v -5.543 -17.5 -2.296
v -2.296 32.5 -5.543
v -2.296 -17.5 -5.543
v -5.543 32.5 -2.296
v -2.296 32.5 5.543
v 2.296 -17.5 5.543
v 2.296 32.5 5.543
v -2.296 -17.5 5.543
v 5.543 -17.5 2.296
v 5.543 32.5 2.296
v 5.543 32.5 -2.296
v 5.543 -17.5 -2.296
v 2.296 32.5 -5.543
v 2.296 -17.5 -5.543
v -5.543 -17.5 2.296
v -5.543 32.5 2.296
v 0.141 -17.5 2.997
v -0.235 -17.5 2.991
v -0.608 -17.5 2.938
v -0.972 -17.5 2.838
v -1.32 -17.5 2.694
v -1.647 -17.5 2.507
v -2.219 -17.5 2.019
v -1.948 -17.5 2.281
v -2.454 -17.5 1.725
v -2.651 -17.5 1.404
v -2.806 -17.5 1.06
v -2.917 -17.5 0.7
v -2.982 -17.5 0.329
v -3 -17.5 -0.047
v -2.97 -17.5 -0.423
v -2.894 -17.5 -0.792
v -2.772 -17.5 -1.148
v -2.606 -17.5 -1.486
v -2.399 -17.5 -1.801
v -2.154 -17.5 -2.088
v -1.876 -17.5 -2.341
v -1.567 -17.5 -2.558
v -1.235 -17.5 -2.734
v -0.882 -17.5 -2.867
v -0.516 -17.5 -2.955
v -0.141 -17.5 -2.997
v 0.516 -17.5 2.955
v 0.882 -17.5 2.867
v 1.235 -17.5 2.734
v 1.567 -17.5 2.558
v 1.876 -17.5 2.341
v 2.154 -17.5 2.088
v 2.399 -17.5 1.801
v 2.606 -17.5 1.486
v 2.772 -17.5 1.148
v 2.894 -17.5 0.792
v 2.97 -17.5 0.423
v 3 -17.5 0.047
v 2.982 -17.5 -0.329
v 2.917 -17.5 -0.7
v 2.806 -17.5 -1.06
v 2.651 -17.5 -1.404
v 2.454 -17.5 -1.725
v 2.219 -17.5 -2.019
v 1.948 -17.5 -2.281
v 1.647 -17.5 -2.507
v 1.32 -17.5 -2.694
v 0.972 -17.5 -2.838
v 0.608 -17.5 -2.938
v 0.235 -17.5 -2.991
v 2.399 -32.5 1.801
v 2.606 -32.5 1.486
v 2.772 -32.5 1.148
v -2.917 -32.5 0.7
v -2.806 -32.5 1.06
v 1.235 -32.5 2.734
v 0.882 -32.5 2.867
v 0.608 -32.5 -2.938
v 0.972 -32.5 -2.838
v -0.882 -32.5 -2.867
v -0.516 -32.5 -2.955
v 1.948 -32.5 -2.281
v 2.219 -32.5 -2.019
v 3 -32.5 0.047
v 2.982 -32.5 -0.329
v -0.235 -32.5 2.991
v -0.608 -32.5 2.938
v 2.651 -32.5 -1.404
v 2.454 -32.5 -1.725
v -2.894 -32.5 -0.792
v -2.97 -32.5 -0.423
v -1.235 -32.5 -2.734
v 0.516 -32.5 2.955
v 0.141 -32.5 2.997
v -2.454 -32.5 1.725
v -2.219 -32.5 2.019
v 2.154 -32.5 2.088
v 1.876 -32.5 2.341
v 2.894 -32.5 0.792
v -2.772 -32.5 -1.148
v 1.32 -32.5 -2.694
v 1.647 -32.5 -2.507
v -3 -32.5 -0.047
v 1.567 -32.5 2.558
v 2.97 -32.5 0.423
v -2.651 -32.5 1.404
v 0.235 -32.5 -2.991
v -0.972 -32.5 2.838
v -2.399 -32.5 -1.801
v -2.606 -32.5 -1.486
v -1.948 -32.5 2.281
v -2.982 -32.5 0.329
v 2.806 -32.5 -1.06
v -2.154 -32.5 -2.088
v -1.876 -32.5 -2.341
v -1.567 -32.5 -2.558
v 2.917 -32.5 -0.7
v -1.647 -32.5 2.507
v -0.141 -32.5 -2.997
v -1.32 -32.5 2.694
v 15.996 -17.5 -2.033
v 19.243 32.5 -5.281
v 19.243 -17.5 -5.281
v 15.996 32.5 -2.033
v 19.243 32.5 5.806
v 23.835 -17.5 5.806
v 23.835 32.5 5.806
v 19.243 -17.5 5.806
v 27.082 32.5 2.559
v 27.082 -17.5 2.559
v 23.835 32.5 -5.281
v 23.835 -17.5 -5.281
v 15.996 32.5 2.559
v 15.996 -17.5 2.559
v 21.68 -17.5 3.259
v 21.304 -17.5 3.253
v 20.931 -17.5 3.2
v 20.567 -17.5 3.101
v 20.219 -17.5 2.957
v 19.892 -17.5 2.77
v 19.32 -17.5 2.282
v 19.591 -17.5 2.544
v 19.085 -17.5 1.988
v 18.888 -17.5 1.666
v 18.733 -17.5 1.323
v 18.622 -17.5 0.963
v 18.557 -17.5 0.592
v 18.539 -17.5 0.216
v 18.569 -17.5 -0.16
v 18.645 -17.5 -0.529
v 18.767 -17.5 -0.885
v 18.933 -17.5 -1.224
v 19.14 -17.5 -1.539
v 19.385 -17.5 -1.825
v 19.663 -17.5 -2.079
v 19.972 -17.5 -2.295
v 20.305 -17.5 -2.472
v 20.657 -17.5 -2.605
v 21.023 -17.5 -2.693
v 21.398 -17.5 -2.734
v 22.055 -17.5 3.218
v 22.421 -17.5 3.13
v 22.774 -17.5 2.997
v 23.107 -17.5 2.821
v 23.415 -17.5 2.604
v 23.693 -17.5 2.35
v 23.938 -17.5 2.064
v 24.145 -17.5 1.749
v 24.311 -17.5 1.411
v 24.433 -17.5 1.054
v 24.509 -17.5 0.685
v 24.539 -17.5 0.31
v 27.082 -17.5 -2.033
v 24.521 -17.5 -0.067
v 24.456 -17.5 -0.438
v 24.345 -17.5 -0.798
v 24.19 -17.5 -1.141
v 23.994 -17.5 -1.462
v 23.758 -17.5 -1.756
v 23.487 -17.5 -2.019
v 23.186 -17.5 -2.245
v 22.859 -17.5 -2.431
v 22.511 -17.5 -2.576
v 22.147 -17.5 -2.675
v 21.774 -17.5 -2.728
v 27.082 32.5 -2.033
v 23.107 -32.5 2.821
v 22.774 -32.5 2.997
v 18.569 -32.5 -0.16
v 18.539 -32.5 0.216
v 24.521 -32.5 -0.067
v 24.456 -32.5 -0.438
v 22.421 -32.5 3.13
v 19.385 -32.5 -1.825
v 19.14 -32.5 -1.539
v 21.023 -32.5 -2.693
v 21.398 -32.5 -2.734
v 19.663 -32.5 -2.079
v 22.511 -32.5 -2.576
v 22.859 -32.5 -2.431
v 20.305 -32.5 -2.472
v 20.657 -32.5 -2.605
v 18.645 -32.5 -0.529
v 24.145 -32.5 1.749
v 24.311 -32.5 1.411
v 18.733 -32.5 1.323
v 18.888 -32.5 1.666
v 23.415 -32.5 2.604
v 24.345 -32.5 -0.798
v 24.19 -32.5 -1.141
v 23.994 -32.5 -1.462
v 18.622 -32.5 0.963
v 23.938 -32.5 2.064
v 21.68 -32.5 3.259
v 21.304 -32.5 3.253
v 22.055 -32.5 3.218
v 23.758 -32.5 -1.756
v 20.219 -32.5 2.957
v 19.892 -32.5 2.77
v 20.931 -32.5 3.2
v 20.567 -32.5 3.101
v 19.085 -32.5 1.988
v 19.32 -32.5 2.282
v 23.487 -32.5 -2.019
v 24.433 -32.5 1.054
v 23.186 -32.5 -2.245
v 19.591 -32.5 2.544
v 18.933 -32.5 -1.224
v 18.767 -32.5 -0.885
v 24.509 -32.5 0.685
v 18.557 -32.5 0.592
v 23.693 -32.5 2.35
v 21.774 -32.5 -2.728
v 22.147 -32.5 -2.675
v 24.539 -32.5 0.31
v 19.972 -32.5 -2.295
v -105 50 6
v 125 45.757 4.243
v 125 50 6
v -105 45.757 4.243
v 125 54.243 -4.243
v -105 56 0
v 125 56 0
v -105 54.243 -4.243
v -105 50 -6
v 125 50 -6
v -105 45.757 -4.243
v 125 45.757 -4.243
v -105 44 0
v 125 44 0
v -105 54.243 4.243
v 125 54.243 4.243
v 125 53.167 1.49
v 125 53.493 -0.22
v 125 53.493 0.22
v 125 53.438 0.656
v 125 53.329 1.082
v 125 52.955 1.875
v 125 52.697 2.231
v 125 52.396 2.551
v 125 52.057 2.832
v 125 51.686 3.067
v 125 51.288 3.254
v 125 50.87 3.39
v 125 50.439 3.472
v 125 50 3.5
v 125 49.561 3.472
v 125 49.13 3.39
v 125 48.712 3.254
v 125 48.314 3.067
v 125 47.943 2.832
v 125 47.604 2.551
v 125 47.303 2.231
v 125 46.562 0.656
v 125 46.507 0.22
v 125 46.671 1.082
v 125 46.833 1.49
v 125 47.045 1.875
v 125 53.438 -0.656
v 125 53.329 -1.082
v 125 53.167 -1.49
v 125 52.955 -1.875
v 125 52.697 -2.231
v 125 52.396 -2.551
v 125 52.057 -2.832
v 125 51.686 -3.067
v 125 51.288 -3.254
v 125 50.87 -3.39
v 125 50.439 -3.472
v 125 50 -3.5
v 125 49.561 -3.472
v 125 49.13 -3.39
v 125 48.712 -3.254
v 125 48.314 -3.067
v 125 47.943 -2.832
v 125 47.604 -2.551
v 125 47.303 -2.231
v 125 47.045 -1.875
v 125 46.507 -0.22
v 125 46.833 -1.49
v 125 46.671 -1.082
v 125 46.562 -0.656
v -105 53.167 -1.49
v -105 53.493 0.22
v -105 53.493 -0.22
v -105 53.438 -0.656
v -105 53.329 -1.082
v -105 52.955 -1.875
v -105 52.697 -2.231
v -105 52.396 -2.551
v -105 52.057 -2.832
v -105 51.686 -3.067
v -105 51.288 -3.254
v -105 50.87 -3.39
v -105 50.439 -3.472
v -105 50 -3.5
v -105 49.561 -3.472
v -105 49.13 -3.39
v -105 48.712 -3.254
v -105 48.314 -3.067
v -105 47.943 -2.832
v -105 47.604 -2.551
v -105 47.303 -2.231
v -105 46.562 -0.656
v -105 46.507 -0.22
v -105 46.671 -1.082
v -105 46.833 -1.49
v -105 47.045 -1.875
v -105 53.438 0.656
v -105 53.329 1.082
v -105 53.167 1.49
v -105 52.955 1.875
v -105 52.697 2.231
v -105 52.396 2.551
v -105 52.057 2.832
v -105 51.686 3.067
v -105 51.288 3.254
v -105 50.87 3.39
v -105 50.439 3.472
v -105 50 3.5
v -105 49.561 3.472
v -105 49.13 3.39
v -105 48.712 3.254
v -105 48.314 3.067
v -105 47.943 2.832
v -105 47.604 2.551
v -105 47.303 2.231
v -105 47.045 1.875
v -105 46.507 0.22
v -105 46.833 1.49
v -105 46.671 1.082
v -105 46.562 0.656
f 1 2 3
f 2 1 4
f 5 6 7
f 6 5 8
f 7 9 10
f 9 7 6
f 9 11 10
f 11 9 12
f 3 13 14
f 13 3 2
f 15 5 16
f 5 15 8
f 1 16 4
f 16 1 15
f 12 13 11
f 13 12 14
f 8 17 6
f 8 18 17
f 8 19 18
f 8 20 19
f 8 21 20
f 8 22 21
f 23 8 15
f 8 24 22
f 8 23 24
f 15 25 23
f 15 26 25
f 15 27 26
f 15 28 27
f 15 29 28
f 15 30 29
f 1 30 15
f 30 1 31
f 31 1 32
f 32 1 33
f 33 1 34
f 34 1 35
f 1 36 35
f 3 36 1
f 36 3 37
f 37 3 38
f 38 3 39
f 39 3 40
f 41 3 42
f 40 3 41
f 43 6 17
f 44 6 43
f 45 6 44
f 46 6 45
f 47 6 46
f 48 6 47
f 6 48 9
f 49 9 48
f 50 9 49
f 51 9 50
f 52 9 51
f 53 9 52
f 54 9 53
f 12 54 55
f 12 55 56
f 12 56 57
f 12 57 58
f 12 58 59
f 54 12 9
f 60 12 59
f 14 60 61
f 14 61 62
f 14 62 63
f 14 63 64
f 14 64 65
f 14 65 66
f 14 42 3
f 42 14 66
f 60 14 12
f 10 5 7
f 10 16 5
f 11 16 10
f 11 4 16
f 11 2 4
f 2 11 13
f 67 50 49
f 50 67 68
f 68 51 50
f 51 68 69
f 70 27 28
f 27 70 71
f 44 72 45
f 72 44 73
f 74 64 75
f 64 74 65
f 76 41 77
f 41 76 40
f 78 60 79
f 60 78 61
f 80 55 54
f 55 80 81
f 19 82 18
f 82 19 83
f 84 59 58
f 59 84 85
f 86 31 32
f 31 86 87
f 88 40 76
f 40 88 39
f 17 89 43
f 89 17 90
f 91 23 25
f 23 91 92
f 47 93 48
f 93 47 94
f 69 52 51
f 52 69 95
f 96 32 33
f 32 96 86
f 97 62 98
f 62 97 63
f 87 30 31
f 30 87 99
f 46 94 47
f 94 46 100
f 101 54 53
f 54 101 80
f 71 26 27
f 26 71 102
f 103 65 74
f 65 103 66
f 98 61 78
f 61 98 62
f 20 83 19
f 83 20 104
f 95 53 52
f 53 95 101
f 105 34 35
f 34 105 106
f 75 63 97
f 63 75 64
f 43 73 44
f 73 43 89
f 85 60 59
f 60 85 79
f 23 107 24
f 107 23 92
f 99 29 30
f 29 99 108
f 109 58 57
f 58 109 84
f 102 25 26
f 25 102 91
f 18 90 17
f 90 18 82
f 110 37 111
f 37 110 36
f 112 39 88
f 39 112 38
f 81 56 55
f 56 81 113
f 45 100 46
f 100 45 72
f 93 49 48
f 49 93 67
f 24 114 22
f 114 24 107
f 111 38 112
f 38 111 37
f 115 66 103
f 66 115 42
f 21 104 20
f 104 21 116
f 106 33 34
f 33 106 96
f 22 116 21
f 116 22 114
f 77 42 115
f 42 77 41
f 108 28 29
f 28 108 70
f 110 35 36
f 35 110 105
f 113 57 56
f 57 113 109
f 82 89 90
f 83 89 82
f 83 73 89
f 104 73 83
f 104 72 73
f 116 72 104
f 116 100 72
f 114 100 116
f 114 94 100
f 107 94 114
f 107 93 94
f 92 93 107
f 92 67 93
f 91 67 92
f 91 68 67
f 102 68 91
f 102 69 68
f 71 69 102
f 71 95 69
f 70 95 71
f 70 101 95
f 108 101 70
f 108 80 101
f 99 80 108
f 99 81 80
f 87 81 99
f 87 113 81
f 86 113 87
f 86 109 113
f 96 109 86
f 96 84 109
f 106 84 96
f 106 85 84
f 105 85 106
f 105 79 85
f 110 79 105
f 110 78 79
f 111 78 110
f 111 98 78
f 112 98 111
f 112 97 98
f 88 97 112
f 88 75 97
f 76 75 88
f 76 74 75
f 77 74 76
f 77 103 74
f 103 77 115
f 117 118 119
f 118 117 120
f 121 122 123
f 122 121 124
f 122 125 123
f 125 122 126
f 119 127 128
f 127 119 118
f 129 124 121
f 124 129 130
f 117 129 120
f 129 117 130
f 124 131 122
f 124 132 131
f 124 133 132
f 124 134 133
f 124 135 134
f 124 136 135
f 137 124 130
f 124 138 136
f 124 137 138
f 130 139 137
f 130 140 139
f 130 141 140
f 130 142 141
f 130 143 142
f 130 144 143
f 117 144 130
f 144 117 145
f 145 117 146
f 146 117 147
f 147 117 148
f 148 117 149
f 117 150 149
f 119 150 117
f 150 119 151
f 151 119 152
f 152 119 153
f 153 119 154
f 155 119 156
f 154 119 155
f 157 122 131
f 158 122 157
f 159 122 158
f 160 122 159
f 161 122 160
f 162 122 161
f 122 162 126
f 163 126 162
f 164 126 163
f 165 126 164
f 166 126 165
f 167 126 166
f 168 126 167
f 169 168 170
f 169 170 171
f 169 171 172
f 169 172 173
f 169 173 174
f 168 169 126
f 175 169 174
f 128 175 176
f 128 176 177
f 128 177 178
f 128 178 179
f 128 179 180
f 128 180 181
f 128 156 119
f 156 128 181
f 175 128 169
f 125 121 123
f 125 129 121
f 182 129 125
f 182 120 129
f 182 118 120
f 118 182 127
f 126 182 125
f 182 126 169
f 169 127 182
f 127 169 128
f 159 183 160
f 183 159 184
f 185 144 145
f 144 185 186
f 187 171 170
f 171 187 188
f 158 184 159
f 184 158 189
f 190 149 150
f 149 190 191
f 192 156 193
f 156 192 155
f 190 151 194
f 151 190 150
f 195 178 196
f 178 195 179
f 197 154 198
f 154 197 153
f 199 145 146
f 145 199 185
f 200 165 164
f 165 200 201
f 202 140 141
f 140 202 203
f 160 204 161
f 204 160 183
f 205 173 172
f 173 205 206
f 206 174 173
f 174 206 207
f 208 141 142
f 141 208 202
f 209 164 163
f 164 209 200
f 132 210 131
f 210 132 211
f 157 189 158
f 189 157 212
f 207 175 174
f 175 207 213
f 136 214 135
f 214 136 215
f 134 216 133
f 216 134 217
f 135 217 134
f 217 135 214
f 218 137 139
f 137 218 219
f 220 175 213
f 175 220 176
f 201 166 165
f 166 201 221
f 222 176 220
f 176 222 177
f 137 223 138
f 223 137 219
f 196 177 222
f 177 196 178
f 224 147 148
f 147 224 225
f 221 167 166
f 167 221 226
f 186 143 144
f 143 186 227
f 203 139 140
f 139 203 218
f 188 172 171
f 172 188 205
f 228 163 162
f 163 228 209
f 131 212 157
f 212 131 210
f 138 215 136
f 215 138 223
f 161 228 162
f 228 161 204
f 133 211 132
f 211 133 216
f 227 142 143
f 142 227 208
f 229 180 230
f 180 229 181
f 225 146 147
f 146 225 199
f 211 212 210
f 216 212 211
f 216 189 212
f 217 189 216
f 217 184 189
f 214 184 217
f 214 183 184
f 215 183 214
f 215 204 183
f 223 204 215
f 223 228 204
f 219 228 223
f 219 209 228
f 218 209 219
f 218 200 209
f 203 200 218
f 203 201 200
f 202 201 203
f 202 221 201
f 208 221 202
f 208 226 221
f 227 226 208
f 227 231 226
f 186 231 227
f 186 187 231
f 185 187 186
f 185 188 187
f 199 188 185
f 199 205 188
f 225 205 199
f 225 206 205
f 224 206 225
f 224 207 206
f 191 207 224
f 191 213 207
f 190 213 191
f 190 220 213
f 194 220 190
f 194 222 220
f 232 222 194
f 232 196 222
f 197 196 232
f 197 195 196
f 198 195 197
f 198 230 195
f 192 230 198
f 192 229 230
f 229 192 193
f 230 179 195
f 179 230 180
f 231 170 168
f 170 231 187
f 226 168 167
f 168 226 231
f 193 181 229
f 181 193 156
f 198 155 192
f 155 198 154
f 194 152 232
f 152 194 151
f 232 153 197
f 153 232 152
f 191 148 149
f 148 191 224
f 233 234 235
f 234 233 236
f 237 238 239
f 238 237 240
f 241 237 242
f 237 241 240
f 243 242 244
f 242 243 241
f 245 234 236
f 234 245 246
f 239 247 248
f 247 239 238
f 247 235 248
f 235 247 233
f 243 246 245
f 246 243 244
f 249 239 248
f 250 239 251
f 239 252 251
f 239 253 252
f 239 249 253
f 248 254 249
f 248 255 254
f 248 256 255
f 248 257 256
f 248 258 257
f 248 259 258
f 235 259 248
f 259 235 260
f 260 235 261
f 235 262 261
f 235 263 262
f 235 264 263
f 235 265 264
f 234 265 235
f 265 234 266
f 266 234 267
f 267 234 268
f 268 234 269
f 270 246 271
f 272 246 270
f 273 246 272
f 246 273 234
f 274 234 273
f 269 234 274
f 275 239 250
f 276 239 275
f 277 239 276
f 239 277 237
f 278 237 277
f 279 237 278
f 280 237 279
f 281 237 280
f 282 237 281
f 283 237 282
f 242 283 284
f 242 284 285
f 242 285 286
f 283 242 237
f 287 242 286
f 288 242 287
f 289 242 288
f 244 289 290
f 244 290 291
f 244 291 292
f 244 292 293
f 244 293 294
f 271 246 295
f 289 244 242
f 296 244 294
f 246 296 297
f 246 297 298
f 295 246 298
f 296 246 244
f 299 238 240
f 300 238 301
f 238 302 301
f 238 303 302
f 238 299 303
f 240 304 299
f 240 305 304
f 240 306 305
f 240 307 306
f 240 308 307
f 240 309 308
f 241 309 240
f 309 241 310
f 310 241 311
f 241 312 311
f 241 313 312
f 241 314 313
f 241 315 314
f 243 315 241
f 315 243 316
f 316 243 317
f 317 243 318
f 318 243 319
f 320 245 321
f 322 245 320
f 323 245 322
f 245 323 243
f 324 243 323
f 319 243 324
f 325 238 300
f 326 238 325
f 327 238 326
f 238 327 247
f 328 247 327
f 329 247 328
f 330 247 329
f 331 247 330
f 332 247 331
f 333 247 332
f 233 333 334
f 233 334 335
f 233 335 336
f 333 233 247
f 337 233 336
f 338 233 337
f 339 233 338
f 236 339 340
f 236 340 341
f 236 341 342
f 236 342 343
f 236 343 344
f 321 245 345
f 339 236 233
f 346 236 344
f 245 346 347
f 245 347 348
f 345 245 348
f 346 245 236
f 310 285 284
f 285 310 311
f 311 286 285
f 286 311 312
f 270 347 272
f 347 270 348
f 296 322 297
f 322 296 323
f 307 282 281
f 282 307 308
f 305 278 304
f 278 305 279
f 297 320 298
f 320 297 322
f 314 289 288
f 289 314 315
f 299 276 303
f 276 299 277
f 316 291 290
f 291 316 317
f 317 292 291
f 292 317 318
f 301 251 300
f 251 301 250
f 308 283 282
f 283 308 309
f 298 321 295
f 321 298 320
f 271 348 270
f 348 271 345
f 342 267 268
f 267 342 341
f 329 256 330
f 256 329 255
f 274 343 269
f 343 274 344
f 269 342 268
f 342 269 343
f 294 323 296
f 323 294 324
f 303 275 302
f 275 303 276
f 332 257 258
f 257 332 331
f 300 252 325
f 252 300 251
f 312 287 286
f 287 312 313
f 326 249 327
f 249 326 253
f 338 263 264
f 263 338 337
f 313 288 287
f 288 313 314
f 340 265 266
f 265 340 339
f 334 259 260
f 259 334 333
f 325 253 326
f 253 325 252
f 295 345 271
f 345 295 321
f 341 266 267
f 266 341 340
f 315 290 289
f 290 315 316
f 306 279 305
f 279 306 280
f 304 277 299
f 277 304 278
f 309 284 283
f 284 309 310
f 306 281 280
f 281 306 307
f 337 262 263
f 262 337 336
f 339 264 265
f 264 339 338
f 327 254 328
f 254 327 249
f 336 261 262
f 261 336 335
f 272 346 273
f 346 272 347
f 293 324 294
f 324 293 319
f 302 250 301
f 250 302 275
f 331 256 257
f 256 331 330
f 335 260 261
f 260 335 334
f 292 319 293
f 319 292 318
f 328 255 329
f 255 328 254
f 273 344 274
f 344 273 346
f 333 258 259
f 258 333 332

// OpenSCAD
// [FL_INDEX: keywords="openscad, 3d_parametric, A_Customized_Magic_Wand, csg_solid" | COT="Parametric OpenSCAD design from 3DCodeverse"]
// Title: A Customized Magic Wand

////////// Magic Wand //////////////////////
////////////by: Mario The Magician////////////////////
/////////////www.mariothemagician.com/////////////////////


//////////Magic Wand Tips///////////////////////
tip_length = 50; // [15:50] 
///////////////////////////////////////////////

//////////////////Center of Wand/////////////////
wand_center = 230; // [30:230] 
////////////////////////////////////////////////



//Magic Wand tip
translate([0,32.5,0])
rotate([90,0,0]) {
rotate([0,0,22.5]) {

union() {
cylinder(r=6,tip_length,$fn=8); // outer end
translate([0,0,tip_length]) // keeps inner dowel attached while sizing
cylinder(r=3,h=15,$fn=50); // inner end
       
      }
translate([20,-8,0])
union() {
cylinder(r=6,tip_length,$fn=8); // outer end
translate([0,0,tip_length]) // keeps inner dowel attached while sizing
cylinder(r=3,h=15,$fn=50); // inner end
       
      }
  
   }

}


translate([0,50,0])
translate([-115,0,0])
rotate([0,90,0])

difference() {
translate([0,0,10])
cylinder(r=6,wand_center,$fn=8); // Center of Wand
cylinder(r=3.5,h=250,$fn=50); // inner hole

}
